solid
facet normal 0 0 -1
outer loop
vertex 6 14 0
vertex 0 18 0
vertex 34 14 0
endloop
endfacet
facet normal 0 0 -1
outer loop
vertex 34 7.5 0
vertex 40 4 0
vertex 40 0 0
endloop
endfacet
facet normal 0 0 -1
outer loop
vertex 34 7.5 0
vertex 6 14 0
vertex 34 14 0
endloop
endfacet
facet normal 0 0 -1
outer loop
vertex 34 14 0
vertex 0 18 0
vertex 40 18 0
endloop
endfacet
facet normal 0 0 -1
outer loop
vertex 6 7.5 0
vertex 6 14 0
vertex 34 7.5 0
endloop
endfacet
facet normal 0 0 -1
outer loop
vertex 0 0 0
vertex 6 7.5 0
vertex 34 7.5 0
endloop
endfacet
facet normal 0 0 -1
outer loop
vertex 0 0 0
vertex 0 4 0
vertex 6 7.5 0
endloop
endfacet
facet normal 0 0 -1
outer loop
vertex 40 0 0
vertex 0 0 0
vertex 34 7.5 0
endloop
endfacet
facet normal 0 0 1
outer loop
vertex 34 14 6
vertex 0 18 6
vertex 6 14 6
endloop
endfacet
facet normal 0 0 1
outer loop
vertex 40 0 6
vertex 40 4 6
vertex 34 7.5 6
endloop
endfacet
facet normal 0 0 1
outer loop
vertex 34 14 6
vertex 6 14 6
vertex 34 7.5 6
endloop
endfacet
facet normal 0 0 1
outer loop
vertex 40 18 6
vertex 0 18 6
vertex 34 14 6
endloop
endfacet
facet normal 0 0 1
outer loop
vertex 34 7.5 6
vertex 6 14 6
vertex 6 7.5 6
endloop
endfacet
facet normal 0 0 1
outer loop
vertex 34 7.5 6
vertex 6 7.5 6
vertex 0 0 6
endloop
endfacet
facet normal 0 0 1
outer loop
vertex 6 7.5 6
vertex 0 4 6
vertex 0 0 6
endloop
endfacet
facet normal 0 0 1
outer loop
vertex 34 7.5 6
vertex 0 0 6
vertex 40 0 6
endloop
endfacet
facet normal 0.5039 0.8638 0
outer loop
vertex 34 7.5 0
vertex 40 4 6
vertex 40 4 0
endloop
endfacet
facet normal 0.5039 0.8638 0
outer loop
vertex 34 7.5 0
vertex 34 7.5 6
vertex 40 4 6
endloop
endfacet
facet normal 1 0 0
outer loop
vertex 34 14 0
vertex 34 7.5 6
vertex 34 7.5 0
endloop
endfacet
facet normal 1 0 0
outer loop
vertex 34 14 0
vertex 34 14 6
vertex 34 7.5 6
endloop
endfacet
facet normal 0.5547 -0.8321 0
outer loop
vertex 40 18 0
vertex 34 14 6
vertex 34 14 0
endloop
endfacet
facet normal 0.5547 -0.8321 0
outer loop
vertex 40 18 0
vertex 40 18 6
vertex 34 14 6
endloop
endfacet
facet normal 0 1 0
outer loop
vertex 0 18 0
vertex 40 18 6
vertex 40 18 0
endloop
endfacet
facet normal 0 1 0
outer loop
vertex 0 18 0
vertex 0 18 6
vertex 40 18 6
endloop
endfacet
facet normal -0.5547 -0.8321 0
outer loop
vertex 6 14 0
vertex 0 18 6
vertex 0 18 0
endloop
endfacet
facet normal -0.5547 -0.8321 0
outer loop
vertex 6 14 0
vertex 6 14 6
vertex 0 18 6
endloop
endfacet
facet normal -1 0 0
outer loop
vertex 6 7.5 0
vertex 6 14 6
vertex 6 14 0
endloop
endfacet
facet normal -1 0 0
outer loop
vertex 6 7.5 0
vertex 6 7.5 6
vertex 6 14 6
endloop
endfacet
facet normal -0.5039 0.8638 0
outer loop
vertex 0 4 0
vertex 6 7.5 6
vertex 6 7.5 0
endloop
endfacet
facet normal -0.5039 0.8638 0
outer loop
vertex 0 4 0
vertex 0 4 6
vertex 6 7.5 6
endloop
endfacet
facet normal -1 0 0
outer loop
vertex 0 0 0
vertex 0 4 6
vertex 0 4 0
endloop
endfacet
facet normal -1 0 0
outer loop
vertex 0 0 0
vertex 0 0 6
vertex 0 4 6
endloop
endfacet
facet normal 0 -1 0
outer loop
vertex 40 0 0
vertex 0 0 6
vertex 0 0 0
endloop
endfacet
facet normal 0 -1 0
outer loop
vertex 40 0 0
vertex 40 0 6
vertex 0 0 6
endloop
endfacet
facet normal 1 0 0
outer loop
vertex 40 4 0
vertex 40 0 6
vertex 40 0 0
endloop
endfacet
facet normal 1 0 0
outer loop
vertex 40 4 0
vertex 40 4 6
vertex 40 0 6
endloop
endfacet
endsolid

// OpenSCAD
$fn = 32;

// ----------------------------------------------------------------------
// Key bar: dovetail key, 6 mm thick
// ----------------------------------------------------------------------

// --- parameters (mm) ---
profile_height = 6;       // extrusion height
profile_points = 10;      // points of the closed outline

profile = [[0, 0], [40, 0], [40, 4], [34, 7.5], [34, 14], [40, 18], [0, 18], [6, 14], [6, 7.5], [0, 4]];  // single closed polygon, 10 points, counter clockwise

// --- the one profile operation ---
linear_extrude(height = profile_height) polygon(points = profile);
